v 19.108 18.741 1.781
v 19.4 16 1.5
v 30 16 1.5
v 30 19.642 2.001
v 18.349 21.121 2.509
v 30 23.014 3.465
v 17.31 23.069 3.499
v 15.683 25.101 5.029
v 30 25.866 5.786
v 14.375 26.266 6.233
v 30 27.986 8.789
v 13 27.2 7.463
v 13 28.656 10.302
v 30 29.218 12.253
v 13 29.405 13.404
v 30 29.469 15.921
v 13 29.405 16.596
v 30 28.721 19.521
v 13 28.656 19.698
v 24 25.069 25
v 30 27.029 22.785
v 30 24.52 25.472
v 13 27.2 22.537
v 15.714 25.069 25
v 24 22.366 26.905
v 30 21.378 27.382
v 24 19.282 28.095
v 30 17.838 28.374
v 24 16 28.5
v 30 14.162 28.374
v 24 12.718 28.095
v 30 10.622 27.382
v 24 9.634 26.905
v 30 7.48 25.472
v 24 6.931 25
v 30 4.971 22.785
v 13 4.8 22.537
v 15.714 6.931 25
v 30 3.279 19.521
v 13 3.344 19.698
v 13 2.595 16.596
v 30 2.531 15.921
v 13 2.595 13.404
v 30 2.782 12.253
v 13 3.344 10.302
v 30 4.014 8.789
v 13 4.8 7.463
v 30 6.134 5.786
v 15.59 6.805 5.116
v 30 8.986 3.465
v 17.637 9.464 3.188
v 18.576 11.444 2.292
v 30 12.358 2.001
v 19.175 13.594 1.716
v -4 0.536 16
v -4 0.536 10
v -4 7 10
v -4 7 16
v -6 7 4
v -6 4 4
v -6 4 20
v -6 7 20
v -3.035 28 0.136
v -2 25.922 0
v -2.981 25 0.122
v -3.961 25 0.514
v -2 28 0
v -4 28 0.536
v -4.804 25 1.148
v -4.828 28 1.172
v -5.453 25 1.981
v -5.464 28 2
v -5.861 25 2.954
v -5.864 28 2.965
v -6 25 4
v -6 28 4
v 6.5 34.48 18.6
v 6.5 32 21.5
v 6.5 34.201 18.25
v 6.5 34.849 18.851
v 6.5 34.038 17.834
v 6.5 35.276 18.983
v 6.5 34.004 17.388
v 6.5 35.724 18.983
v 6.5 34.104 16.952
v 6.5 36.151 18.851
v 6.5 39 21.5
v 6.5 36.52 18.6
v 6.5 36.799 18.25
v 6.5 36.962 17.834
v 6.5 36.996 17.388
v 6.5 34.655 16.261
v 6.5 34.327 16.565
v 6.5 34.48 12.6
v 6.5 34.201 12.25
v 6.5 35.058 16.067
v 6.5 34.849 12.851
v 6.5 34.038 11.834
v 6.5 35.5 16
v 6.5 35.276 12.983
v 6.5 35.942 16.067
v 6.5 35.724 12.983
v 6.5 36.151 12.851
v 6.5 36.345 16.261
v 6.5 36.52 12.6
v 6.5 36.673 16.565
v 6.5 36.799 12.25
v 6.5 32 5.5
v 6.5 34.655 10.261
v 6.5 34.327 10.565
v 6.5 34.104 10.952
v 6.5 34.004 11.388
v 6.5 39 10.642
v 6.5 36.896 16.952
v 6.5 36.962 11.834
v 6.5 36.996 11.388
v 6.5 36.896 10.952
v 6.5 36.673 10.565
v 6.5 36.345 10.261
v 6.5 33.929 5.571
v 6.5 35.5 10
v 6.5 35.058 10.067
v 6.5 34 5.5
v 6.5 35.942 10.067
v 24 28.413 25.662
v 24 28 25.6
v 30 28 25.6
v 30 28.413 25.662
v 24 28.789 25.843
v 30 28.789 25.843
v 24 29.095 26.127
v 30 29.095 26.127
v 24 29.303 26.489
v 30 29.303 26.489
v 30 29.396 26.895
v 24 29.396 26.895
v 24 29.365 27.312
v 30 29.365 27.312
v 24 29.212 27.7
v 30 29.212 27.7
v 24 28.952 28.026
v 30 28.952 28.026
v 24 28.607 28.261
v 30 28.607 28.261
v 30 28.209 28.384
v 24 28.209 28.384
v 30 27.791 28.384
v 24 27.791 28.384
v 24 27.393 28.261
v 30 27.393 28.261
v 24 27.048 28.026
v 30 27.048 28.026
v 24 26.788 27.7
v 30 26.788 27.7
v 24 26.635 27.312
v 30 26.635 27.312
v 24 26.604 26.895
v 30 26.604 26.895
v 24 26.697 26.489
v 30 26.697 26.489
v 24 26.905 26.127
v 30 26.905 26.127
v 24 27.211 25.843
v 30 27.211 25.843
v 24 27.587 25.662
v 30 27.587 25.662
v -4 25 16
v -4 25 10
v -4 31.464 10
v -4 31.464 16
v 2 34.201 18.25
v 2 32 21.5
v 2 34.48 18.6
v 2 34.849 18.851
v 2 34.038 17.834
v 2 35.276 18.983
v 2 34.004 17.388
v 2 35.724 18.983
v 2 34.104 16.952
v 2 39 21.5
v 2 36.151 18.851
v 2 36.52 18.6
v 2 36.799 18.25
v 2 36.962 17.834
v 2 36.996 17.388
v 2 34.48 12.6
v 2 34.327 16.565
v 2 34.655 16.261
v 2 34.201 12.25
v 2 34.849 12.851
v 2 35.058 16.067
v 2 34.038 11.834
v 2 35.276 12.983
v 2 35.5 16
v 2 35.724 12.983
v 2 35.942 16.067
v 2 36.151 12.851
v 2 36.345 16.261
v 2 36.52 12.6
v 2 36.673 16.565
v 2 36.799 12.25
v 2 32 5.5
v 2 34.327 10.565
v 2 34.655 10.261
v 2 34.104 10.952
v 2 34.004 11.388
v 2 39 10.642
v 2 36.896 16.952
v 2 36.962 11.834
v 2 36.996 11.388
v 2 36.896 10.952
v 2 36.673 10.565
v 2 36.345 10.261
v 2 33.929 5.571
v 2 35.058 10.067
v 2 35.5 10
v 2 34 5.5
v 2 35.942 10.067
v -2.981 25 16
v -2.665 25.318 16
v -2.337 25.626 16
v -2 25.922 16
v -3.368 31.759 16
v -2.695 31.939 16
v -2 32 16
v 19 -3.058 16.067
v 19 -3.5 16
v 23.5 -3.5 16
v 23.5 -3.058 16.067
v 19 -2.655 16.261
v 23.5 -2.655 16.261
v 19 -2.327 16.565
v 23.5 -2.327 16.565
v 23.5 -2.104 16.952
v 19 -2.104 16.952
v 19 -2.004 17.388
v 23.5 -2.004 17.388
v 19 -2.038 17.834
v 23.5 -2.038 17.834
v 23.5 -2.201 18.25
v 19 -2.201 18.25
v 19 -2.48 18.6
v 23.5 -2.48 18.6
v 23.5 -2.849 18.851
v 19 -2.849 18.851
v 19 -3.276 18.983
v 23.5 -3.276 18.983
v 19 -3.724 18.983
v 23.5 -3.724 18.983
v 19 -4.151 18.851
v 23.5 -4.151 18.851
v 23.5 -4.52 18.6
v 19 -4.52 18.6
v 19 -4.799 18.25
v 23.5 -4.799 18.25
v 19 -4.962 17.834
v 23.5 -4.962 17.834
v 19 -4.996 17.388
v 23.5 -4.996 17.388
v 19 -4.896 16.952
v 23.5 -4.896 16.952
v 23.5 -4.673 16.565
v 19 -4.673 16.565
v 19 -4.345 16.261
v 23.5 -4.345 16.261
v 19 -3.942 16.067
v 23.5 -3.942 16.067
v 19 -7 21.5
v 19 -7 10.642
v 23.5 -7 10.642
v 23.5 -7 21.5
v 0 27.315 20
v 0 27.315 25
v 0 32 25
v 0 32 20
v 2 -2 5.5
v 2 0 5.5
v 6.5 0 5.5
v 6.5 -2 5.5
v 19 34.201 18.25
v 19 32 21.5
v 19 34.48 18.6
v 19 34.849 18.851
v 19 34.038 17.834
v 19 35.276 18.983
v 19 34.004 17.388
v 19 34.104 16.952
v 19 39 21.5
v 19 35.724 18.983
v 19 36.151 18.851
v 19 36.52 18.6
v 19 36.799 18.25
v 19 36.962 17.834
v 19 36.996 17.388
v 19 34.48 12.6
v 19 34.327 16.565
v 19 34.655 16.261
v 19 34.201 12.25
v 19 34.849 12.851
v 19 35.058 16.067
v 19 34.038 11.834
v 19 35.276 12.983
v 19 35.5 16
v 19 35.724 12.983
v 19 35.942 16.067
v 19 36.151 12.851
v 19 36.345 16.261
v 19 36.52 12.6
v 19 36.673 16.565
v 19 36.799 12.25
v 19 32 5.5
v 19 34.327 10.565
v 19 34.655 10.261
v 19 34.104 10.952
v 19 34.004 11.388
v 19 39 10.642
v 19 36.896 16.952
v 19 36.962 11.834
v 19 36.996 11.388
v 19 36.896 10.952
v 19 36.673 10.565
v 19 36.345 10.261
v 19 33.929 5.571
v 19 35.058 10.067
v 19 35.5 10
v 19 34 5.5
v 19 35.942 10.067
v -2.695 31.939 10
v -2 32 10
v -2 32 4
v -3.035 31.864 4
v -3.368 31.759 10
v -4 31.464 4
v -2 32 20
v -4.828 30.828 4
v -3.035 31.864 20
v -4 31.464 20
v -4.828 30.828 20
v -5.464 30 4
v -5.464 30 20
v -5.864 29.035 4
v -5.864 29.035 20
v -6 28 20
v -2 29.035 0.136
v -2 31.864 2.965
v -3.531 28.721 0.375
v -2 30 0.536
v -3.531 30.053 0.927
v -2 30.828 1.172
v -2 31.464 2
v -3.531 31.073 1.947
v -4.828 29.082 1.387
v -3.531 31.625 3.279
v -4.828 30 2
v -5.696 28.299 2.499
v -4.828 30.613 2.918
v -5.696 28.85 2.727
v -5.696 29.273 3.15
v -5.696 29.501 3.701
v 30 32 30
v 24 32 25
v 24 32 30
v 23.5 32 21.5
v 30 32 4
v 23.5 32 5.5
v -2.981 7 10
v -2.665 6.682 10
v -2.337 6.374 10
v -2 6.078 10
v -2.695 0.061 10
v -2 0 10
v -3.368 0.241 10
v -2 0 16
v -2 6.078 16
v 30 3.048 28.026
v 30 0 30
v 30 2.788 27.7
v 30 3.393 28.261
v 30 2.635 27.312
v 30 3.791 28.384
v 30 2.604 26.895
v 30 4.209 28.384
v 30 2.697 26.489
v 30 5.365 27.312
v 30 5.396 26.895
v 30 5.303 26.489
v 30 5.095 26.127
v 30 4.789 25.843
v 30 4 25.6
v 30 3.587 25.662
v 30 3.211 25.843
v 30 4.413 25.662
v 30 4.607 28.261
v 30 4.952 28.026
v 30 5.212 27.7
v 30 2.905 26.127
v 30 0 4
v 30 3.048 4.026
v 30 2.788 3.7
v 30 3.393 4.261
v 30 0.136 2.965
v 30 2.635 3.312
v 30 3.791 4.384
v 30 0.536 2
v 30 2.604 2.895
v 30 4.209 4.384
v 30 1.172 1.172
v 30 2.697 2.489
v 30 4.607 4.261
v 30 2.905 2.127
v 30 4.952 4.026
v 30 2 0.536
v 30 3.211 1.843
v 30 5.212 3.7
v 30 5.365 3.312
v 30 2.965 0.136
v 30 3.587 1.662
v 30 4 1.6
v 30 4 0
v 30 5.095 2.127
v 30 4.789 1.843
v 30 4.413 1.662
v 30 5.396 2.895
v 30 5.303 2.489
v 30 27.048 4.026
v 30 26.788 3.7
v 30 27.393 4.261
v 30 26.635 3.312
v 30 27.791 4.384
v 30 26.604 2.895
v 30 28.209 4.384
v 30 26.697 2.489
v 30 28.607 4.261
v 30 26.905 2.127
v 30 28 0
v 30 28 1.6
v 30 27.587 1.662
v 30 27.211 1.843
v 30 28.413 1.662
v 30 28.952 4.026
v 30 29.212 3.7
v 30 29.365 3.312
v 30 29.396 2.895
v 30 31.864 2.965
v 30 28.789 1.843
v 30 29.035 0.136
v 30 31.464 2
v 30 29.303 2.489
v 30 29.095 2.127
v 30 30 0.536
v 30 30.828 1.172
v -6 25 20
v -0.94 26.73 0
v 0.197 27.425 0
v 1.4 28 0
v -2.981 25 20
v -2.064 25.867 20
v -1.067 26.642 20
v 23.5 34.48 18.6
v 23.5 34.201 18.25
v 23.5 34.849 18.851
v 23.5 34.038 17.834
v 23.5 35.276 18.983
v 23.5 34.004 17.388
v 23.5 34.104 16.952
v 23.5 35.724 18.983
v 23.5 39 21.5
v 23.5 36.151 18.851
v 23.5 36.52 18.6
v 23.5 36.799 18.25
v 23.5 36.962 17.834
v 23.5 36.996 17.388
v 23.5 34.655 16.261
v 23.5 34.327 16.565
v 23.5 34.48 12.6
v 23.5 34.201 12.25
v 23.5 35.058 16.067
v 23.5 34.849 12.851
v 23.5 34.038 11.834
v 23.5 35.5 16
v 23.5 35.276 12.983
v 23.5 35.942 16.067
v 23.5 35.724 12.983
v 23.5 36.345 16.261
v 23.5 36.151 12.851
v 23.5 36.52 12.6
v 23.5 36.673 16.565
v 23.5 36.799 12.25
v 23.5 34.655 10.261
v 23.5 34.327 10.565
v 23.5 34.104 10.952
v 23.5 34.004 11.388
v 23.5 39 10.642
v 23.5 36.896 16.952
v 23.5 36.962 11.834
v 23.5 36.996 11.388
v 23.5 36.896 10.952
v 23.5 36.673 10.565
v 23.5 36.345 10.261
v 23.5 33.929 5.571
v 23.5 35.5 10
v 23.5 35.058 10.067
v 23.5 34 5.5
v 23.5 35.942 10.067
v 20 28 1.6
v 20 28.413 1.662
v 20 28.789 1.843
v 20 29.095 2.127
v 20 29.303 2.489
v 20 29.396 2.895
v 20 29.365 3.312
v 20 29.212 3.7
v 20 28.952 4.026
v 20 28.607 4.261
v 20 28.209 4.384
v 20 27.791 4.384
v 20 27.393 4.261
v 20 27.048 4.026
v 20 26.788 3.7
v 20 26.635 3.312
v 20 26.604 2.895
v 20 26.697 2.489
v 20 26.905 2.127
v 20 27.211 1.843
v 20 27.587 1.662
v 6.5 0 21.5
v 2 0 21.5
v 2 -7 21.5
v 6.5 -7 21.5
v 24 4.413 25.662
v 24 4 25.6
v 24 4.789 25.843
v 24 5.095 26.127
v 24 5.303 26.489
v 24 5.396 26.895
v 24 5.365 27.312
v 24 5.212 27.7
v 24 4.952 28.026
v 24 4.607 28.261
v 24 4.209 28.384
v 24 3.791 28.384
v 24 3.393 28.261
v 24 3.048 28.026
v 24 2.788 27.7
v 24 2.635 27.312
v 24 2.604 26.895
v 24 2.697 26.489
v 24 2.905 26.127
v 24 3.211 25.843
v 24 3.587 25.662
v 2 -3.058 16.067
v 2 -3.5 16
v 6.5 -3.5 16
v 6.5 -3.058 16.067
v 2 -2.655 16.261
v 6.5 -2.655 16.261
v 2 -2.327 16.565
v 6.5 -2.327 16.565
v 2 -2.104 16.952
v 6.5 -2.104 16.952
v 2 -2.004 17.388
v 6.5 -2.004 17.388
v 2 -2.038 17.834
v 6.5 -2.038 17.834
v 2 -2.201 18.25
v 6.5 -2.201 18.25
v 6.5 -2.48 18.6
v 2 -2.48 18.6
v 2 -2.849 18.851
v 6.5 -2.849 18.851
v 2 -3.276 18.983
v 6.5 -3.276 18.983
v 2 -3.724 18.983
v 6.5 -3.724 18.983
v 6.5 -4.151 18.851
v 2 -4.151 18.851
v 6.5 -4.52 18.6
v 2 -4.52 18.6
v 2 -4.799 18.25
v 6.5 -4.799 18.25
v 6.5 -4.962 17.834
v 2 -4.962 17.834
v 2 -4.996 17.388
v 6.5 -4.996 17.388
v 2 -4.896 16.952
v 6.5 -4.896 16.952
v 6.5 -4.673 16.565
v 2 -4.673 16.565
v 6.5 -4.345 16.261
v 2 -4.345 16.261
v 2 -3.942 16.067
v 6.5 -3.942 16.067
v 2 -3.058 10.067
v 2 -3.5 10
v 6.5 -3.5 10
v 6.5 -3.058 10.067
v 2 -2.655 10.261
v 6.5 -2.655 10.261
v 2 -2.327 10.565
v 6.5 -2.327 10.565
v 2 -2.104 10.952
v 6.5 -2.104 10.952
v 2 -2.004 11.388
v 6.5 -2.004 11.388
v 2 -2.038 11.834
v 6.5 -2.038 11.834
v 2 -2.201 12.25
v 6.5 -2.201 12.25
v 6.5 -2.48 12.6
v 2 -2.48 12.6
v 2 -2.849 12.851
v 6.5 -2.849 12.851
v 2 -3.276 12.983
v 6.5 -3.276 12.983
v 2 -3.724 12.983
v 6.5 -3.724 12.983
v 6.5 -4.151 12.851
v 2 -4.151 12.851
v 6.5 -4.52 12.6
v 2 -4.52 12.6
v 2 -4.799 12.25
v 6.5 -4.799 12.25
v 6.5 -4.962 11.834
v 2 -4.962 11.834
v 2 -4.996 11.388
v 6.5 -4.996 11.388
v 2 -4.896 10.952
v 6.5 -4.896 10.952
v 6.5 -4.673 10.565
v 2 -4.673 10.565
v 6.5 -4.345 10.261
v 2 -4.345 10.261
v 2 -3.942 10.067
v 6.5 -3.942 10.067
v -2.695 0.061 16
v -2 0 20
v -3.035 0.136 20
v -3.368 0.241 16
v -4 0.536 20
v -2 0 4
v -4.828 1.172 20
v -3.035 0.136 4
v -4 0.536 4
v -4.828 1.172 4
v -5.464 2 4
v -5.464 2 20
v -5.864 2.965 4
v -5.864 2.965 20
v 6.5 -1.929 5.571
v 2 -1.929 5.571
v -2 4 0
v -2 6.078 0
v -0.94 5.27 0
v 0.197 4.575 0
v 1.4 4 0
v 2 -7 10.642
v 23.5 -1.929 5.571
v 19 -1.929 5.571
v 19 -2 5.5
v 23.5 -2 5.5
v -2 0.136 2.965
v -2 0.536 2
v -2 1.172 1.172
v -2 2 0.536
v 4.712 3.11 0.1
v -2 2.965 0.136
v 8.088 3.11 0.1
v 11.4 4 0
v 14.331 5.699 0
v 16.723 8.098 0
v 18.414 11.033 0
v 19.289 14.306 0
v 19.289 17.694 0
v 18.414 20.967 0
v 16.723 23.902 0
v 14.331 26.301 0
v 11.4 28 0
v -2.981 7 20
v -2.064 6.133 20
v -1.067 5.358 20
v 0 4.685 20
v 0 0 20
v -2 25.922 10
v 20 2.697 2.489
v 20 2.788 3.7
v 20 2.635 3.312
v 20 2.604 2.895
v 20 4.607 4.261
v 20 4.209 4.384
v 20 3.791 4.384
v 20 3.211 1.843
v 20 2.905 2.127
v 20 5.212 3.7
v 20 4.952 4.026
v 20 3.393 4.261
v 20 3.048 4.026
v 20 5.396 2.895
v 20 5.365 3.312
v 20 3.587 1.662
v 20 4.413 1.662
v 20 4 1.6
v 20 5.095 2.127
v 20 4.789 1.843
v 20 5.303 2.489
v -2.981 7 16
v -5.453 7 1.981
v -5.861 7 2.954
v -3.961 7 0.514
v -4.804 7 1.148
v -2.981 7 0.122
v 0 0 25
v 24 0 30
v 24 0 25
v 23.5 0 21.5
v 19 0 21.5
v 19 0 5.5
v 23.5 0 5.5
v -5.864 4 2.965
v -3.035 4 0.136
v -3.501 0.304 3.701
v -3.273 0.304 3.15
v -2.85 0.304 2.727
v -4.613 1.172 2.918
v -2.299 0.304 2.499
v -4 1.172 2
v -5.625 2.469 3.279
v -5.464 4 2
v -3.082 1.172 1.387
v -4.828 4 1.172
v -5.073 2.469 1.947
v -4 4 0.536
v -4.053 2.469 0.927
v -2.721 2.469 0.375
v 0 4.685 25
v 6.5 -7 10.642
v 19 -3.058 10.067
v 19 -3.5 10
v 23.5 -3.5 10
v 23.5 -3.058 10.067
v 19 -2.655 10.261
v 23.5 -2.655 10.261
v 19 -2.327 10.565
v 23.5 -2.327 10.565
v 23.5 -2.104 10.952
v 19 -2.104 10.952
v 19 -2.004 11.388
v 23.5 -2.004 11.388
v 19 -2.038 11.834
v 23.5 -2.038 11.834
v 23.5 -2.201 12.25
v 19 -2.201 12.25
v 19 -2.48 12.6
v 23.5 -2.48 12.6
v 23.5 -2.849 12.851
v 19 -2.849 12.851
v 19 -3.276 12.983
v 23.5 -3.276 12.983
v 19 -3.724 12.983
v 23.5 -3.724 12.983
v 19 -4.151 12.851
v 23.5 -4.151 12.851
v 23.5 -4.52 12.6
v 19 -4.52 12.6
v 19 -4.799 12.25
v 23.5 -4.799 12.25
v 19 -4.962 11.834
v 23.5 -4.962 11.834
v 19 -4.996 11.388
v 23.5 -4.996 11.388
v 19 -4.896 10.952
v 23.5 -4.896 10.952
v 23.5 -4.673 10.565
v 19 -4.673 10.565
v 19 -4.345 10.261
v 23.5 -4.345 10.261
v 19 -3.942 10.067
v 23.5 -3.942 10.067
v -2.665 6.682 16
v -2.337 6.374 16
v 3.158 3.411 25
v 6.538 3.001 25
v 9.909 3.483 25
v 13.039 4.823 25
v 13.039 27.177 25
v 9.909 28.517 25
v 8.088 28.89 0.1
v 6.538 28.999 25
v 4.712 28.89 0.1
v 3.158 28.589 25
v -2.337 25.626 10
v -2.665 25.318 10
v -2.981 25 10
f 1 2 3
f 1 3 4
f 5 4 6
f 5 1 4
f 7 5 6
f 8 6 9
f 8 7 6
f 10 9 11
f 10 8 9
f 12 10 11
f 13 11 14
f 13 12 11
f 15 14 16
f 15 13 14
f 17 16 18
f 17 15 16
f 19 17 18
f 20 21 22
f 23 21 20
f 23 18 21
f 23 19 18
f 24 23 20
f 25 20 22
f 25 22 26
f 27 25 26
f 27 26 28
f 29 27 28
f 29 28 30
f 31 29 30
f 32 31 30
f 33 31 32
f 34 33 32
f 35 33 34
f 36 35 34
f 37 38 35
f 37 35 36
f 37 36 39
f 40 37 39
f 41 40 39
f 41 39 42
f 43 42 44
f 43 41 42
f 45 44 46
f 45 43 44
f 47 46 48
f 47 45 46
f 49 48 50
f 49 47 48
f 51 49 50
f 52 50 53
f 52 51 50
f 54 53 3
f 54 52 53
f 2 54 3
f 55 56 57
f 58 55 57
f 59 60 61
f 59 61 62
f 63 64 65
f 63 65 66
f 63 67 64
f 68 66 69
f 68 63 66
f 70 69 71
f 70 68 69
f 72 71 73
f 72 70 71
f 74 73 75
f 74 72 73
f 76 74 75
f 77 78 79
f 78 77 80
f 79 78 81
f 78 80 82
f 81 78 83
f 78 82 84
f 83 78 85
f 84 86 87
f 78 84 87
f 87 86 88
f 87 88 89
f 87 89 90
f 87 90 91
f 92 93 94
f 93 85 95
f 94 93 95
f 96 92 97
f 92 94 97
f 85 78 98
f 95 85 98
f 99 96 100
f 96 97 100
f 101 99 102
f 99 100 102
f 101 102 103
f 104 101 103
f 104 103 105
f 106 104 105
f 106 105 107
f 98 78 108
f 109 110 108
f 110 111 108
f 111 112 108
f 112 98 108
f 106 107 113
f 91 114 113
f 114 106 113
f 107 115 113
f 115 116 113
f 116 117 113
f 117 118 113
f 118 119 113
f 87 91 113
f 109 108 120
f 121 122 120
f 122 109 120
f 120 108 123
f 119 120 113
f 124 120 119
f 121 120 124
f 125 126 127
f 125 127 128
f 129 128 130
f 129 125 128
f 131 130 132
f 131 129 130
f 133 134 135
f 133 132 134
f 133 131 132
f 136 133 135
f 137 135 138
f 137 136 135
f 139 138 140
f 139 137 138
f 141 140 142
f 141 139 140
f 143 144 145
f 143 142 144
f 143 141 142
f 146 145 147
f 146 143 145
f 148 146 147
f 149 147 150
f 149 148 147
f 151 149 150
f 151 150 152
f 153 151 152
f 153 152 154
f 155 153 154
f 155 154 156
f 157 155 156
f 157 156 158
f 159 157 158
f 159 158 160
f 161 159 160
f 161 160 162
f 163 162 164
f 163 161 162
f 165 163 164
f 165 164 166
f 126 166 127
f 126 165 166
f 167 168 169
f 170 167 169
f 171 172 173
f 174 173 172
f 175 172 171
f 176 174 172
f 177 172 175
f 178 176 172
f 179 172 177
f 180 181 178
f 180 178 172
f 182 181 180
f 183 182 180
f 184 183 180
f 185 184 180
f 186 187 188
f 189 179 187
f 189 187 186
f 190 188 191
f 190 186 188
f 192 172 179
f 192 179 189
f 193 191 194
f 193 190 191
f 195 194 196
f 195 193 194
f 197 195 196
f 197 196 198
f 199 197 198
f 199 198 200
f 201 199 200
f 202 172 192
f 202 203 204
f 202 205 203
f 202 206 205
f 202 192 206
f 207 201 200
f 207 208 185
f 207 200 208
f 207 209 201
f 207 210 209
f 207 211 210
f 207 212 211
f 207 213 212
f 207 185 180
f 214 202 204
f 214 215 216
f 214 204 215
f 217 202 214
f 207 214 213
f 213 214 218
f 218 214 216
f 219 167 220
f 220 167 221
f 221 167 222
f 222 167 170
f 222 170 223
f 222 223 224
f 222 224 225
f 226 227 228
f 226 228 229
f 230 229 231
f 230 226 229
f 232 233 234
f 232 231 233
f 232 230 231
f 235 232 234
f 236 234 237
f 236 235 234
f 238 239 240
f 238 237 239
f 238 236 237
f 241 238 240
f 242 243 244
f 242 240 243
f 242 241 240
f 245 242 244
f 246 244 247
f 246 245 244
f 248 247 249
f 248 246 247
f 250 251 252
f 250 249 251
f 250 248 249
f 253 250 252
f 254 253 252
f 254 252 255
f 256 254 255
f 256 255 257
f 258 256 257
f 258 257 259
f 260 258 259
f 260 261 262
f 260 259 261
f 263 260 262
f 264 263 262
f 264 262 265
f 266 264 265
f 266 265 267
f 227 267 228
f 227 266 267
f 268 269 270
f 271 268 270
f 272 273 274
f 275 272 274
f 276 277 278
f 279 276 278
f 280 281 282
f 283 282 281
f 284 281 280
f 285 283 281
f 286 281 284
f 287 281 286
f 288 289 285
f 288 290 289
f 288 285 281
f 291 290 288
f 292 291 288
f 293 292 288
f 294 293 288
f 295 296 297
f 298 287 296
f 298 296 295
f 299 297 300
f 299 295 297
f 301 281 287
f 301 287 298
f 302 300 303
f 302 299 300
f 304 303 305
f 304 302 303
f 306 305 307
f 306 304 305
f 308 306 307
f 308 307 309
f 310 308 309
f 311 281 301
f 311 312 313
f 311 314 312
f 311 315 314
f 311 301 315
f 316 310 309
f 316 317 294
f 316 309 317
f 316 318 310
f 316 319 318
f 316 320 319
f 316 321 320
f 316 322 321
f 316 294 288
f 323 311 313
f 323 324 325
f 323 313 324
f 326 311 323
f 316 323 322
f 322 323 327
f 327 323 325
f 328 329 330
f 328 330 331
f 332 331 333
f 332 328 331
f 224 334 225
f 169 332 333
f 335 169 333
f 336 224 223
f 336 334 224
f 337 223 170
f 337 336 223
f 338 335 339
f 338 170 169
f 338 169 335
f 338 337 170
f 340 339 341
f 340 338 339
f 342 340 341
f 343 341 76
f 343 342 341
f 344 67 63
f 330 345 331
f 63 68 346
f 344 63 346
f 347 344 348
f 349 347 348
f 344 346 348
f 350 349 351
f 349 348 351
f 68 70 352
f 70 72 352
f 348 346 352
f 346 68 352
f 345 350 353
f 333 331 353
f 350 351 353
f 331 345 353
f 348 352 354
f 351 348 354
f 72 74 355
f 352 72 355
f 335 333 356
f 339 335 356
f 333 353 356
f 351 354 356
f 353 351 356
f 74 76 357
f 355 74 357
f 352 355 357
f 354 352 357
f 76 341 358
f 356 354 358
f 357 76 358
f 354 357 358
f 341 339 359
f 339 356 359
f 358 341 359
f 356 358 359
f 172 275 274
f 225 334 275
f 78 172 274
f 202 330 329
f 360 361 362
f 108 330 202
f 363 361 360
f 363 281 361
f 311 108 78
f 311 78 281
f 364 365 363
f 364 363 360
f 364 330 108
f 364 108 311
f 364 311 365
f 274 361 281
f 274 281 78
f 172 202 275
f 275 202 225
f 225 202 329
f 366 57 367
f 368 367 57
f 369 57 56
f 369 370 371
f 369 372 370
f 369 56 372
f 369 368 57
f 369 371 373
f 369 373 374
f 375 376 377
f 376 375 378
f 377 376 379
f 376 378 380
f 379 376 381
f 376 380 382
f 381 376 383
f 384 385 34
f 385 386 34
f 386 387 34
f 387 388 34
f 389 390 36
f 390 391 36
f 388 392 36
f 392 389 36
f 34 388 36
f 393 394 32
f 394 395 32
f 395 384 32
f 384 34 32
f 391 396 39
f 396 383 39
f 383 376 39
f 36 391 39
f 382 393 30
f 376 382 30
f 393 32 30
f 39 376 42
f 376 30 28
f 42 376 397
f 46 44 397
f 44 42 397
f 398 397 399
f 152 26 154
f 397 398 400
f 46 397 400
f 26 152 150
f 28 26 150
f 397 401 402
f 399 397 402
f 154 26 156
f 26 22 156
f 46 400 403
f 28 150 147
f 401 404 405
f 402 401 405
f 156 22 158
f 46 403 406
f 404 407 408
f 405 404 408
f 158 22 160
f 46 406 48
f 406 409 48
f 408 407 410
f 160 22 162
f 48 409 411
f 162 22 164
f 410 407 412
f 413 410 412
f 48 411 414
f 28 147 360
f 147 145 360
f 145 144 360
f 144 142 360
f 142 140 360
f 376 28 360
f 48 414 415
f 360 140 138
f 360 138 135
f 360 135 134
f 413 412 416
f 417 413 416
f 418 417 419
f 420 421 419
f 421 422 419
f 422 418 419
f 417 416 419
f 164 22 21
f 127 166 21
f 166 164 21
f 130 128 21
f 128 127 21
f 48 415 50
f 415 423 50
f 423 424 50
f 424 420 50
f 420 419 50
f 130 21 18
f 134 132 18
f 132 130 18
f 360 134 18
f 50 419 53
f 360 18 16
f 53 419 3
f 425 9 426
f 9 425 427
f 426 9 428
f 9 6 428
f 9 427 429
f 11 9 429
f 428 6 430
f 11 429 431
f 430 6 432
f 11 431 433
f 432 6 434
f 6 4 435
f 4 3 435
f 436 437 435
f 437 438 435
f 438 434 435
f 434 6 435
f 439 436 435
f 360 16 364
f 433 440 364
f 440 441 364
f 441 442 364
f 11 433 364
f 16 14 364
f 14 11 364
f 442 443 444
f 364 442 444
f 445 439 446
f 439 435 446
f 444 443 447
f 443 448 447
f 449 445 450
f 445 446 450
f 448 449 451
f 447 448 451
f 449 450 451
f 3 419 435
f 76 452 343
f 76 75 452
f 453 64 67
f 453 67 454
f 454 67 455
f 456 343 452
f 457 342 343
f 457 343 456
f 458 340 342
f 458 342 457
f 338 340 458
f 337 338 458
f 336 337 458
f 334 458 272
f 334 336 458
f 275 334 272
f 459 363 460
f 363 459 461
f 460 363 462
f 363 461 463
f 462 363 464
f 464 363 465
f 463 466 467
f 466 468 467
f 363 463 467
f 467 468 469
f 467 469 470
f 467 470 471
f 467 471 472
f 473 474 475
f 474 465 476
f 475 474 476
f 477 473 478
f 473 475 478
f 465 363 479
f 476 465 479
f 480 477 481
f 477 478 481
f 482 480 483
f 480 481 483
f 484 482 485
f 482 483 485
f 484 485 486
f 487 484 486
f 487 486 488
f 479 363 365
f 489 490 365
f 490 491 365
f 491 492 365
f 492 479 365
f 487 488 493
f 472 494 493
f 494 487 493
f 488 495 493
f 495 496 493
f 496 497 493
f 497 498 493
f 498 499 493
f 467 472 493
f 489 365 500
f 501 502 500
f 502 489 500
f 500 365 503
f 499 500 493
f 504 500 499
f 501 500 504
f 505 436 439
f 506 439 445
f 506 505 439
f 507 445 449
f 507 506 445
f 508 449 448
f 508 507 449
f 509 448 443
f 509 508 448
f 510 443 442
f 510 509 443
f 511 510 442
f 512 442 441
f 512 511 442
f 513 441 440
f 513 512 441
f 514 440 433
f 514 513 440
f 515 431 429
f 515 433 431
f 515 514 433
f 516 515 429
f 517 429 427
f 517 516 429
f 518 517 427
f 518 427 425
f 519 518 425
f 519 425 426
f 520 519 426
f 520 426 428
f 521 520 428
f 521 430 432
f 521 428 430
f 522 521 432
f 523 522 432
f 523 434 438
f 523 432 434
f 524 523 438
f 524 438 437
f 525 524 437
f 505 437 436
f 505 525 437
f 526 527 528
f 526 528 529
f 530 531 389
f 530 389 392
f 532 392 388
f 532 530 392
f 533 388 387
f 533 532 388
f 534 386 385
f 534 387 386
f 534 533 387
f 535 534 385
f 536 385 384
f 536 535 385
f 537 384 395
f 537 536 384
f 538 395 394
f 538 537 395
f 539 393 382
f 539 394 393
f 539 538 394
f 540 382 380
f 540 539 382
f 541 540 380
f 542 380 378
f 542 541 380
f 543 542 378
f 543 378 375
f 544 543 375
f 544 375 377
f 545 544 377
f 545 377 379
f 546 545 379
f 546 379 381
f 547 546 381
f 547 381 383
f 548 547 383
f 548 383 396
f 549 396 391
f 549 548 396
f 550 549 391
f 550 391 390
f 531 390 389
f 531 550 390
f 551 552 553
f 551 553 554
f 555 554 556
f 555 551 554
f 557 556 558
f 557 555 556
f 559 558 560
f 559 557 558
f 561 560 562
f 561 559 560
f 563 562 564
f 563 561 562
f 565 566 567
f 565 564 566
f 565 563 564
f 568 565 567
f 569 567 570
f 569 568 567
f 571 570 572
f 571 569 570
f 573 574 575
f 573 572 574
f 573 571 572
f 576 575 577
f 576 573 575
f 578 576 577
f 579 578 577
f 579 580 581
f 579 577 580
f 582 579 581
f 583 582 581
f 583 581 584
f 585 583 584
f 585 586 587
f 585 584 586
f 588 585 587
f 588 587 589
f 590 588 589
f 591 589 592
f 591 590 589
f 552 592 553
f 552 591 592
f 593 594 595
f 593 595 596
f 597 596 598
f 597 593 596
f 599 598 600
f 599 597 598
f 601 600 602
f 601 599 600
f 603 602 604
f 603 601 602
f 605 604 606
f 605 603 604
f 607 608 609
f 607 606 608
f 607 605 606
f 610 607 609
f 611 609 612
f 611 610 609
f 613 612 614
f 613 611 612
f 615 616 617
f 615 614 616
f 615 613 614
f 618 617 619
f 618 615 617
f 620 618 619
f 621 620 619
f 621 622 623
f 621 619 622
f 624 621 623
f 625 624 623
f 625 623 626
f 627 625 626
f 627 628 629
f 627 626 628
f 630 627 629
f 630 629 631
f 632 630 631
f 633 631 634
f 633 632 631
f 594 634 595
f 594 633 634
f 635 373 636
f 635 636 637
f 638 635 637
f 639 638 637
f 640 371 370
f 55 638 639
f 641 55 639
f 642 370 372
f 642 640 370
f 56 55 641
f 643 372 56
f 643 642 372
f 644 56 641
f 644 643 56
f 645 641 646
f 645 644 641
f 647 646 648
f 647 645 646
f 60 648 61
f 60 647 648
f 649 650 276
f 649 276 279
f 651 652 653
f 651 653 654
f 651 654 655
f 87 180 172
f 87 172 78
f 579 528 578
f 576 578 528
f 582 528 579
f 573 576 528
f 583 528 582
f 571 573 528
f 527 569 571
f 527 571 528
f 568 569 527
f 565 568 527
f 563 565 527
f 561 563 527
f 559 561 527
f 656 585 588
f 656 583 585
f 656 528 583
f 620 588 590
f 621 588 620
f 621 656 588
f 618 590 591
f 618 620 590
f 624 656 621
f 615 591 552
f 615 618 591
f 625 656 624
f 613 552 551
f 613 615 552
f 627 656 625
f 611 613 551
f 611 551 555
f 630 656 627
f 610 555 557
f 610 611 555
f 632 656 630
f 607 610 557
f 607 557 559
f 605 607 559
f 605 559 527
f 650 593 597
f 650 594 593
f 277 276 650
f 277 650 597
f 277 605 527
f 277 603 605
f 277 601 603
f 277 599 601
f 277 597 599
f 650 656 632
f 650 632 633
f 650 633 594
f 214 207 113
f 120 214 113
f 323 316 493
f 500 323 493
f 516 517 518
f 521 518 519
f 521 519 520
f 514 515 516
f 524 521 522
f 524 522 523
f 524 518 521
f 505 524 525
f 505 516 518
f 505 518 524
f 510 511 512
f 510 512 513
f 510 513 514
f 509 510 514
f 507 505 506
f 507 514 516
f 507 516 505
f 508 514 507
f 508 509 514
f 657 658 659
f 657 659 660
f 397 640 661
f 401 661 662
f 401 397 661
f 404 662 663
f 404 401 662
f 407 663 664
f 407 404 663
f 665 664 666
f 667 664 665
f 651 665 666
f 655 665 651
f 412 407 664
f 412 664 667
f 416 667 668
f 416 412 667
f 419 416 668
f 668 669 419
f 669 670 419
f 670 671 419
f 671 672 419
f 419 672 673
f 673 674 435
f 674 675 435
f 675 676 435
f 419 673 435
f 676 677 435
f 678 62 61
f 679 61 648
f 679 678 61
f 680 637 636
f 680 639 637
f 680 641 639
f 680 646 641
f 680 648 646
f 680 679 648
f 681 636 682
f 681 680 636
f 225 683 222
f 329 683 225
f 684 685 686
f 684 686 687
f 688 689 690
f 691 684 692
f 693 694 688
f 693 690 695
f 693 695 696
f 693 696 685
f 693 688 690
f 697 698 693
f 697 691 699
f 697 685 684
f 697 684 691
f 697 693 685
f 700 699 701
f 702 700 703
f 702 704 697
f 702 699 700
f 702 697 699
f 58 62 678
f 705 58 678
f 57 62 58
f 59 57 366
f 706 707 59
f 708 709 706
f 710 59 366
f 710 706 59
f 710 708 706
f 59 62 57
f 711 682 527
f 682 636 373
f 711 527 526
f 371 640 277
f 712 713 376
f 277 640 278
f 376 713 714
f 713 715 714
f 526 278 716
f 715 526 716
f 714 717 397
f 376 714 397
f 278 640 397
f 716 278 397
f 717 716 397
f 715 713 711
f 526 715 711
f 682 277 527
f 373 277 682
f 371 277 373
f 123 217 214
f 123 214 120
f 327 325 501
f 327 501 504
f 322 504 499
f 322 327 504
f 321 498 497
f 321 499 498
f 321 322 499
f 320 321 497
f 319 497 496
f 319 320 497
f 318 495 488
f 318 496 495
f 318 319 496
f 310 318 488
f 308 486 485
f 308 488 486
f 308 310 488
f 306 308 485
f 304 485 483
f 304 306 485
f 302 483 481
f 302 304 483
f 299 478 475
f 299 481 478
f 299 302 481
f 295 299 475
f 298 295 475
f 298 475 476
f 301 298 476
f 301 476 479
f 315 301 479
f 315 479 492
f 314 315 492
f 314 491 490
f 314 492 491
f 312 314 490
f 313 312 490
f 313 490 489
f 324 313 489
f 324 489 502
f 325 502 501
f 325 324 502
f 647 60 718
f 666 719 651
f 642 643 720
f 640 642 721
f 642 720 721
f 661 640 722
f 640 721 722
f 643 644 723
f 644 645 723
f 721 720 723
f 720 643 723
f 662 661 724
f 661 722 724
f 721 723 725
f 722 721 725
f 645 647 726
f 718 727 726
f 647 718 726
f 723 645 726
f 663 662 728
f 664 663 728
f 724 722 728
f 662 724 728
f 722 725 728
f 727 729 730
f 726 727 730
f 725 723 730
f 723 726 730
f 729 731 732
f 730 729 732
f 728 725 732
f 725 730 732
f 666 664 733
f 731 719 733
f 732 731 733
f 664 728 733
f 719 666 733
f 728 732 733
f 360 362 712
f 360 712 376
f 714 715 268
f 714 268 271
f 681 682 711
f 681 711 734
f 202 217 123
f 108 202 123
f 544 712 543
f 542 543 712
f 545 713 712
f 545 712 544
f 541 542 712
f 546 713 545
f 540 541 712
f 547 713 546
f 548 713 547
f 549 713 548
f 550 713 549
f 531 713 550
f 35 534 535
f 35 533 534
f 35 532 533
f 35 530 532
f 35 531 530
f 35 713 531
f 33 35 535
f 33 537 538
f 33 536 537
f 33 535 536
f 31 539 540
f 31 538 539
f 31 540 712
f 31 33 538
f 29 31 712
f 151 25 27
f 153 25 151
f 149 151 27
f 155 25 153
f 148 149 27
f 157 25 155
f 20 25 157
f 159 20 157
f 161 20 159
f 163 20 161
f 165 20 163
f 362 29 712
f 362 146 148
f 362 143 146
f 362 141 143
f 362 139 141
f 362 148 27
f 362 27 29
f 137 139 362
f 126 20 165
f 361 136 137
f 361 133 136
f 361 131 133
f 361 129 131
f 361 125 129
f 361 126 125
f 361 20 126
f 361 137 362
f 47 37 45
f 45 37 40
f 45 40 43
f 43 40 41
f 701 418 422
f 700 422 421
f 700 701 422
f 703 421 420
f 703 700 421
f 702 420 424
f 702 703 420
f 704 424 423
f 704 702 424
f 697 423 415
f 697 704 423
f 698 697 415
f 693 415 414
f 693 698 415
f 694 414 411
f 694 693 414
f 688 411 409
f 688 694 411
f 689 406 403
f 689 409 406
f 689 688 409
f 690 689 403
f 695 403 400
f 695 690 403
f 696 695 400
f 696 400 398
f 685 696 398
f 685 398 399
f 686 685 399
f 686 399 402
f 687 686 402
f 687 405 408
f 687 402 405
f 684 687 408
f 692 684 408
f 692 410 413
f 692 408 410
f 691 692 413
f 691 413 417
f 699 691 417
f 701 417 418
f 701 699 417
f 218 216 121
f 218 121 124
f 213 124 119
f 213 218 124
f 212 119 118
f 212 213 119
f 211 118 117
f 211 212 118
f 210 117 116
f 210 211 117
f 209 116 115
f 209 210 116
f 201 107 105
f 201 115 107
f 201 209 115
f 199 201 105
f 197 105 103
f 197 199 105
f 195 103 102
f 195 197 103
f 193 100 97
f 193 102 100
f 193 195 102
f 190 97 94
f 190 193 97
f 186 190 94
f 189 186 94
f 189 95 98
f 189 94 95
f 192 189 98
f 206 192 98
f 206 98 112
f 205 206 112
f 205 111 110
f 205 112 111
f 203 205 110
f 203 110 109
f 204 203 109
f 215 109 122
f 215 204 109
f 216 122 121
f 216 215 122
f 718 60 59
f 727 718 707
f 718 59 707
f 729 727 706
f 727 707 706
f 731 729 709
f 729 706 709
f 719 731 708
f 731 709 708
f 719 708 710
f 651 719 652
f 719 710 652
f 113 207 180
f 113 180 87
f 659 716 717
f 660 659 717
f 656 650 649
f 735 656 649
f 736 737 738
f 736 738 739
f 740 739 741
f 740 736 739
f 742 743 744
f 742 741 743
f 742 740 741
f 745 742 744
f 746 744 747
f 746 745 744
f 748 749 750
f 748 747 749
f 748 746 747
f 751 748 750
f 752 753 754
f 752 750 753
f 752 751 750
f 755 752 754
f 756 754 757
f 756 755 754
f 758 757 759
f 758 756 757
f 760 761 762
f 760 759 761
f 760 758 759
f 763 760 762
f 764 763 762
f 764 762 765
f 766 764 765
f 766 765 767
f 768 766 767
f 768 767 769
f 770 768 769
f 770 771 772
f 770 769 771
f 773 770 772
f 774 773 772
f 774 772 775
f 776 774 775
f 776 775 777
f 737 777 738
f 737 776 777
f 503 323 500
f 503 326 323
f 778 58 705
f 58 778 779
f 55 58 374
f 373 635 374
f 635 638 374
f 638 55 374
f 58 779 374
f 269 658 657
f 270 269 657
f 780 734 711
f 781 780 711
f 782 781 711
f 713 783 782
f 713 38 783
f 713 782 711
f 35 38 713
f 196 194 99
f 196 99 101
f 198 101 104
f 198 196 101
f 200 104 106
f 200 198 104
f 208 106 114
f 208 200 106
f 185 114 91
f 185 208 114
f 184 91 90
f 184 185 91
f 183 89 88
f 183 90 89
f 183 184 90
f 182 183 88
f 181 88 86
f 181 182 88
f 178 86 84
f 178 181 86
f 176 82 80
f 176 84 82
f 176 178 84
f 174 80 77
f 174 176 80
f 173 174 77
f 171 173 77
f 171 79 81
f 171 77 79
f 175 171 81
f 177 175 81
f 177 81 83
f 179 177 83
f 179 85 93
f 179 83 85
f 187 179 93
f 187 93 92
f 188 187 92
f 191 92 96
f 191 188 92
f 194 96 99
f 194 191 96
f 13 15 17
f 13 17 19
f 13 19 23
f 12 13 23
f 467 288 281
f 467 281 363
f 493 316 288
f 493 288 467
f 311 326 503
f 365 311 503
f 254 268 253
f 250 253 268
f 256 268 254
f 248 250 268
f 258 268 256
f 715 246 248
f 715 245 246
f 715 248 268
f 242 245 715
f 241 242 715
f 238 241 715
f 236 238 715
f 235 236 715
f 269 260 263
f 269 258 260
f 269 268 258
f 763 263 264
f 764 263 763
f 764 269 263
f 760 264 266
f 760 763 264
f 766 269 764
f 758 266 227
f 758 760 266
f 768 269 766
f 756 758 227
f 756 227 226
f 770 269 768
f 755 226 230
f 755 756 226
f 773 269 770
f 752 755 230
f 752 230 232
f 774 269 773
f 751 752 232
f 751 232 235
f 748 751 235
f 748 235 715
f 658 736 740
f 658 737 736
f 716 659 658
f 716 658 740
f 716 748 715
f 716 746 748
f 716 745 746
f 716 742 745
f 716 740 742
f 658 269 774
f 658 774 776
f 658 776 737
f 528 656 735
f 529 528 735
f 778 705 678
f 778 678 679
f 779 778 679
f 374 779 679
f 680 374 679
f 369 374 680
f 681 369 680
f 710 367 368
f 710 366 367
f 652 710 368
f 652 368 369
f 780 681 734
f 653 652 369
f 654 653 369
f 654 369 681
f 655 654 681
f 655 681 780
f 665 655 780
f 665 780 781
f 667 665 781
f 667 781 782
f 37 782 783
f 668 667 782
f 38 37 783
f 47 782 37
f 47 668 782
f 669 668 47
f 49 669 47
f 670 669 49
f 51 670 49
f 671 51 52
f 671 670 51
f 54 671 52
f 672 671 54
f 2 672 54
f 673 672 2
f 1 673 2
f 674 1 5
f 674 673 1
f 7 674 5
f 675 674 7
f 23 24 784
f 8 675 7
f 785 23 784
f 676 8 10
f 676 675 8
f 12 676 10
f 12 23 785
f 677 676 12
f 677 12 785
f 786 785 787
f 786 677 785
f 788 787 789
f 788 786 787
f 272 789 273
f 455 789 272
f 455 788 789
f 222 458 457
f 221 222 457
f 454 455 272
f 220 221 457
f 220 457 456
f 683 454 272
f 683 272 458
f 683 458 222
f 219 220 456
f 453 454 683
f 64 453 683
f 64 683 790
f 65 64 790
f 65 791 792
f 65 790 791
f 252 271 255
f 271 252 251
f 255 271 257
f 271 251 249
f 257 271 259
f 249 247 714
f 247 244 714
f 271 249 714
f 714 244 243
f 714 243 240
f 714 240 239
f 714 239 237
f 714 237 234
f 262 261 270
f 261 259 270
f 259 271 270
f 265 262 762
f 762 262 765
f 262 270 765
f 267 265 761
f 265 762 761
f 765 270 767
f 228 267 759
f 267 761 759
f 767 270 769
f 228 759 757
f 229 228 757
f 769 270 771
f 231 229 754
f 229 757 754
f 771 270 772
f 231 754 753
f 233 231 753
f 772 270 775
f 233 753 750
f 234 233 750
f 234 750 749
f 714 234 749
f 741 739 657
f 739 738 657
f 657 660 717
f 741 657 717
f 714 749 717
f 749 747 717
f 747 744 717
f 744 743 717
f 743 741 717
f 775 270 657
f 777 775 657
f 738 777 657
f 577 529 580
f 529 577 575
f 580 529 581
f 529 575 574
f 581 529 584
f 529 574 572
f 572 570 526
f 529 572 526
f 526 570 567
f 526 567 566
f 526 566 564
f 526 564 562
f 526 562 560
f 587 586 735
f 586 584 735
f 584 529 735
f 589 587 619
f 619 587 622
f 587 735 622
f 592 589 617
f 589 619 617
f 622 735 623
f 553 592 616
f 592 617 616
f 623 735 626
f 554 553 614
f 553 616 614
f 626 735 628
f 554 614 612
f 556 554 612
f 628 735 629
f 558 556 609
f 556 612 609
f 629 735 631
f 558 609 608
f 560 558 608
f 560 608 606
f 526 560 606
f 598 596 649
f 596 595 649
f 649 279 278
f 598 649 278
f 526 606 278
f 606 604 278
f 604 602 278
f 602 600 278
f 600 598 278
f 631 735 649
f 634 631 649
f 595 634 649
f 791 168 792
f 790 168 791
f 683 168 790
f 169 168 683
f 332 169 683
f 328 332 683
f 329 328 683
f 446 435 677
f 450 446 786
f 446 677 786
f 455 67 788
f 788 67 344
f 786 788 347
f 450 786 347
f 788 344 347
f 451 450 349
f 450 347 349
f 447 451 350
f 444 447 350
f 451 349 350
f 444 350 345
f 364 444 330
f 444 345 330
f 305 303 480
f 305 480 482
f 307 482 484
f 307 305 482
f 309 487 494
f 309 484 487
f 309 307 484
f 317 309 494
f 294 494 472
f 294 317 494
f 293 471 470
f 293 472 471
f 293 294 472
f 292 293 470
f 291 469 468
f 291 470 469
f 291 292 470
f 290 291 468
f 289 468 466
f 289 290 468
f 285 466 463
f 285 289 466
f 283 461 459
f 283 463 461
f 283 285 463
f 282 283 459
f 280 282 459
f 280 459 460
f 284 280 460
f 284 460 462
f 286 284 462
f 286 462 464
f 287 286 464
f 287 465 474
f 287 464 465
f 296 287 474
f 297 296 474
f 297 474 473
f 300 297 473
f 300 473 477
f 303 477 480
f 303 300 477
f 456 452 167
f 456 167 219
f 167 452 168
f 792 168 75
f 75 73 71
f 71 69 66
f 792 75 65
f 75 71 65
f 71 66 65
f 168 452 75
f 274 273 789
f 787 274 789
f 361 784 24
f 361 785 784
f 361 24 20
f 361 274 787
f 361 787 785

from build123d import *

# Parameters (mm, degrees)
BOX010_W                = 22
BOX010_H                = 10
BOX010_DEPTH            = 10
BOX010_ROLL_ANGLE       = 45
BOX009_W                = 22
BOX009_H                = 10
BOX009_DEPTH            = 10
BOX009_ROLL_ANGLE       = 45
CYLINDER010_R           = 1.5
CYLINDER010_DEPTH       = 40
CYLINDER010_PITCH_ANGLE = 90
CYLINDER011_R           = 1.5
CYLINDER011_DEPTH       = 40
CYLINDER011_PITCH_ANGLE = 90
CYLINDER012_R           = 1.5
CYLINDER012_DEPTH       = 40
CYLINDER012_PITCH_ANGLE = 90
CYLINDER009_R           = 1.5
CYLINDER009_DEPTH       = 40
CYLINDER009_PITCH_ANGLE = 90
BOX004_W                = 2
BOX004_H                = 32
BOX004_DEPTH            = 6
CYLINDER_R              = 13
CYLINDER_DEPTH          = 25
CYLINDER001_R           = 13.5
CYLINDER001_DEPTH       = 18
CYLINDER001_PITCH_ANGLE = 90
CYLINDER003_R           = 1.4
CYLINDER003_DEPTH       = 20
CYLINDER003_PITCH_ANGLE = 90
CYLINDER005_R           = 1.4
CYLINDER005_DEPTH       = 20
CYLINDER005_PITCH_ANGLE = 90
CYLINDER004_R           = 1.4
CYLINDER004_DEPTH       = 20
CYLINDER004_PITCH_ANGLE = 90
CYLINDER002_R           = 1.4
CYLINDER002_DEPTH       = 20
CYLINDER002_PITCH_ANGLE = 90
BOX002_W                = 6
BOX002_H                = 7
BOX002_DEPTH            = 20
BOX006_W                = 4.5
BOX006_H                = 7
BOX006_DEPTH            = 16
BOX007_W                = 4.5
BOX007_H                = 7
BOX007_DEPTH            = 16
BOX008_W                = 4.5
BOX008_H                = 7
BOX008_DEPTH            = 16
BOX005_W                = 4.5
BOX005_H                = 7
BOX005_DEPTH            = 16
BOX003_W                = 6
BOX003_H                = 7
BOX003_DEPTH            = 20
BOX001_W                = 6
BOX001_H                = 32
BOX001_DEPTH            = 30
BOX_W                   = 24
BOX_H                   = 32
BOX_DEPTH               = 25
FILLET_R                = 4
FILLET001_R             = 4
FILLET002_R             = 4
FILLET003_R             = 4


with BuildPart() as cube010:
    # Box010 → Box010 (new body)
    with BuildSketch(Plane.XY):
        with Locations((11, 5)):
            Rectangle(BOX010_W, BOX010_H)
    extrude(amount=BOX010_DEPTH)


with BuildPart() as cube010_1:
    # Box010 roll: moved
    add(cube010.part.rotate(Axis((0, 0, 0), (1, 0, 0)), BOX010_ROLL_ANGLE))


with BuildPart() as cube010_2:
    # Box010 placement: moved
    add(cube010_1.part.moved(Location((2, 41, -7))))


with BuildPart() as fusionwingcuts:
    # Box009 → Box009 (new body)
    with BuildSketch(Plane.XY):
        with Locations((11, 5)):
            Rectangle(BOX009_W, BOX009_H)
    extrude(amount=BOX009_DEPTH)


with BuildPart() as fusionwingcuts_1:
    # Box009 roll: moved
    add(fusionwingcuts.part.rotate(Axis((0, 0, 0), (1, 0, 0)), BOX009_ROLL_ANGLE))


with BuildPart() as fusionwingcuts_2:
    # Box009 placement: moved
    add(fusionwingcuts_1.part.moved(Location((2, -9, -7))))

    # Fusion005: union Cube010
    add(cube010_2.part)


with BuildPart() as fusionwingcuts_3:
    # Fusion005 placement: moved
    add(fusionwingcuts_2.part.moved(Location((0, 0, 5.5))))


with BuildPart() as cylinder010:
    # Cylinder010 → Cylinder010 (new body)
    with BuildSketch(Plane.XY):
        Circle(CYLINDER010_R)
    extrude(amount=CYLINDER010_DEPTH)


with BuildPart() as cylinder010_1:
    # Cylinder010 pitch: moved
    add(cylinder010.part.rotate(Axis((0, 0, 0), (0, 1, 0)), CYLINDER010_PITCH_ANGLE))


with BuildPart() as cylinder010_2:
    # Cylinder010 placement: moved
    add(cylinder010_1.part.moved(Location((0, -3.5, 6))))


with BuildPart() as cylinder011:
    # Cylinder011 → Cylinder011 (new body)
    with BuildSketch(Plane.XY):
        Circle(CYLINDER011_R)
    extrude(amount=CYLINDER011_DEPTH)


with BuildPart() as cylinder011_1:
    # Cylinder011 pitch: moved
    add(cylinder011.part.rotate(Axis((0, 0, 0), (0, 1, 0)), CYLINDER011_PITCH_ANGLE))


with BuildPart() as cylinder011_2:
    # Cylinder011 placement: moved
    add(cylinder011_1.part.moved(Location((0, 35.5, 12))))


with BuildPart() as cylinder012:
    # Cylinder012 → Cylinder012 (new body)
    with BuildSketch(Plane.XY):
        Circle(CYLINDER012_R)
    extrude(amount=CYLINDER012_DEPTH)


with BuildPart() as cylinder012_1:
    # Cylinder012 pitch: moved
    add(cylinder012.part.rotate(Axis((0, 0, 0), (0, 1, 0)), CYLINDER012_PITCH_ANGLE))


with BuildPart() as cylinder012_2:
    # Cylinder012 placement: moved
    add(cylinder012_1.part.moved(Location((0, 35.5, 6))))


with BuildPart() as fusionwingscrews:
    # Cylinder009 → Cylinder009 (new body)
    with BuildSketch(Plane.XY):
        Circle(CYLINDER009_R)
    extrude(amount=CYLINDER009_DEPTH)


with BuildPart() as fusionwingscrews_1:
    # Cylinder009 pitch: moved
    add(fusionwingscrews.part.rotate(Axis((0, 0, 0), (0, 1, 0)), CYLINDER009_PITCH_ANGLE))


with BuildPart() as fusionwingscrews_2:
    # Cylinder009 placement: moved
    add(fusionwingscrews_1.part.moved(Location((0, -3.5, 12))))

    # Fusion004: union Cylinder010, Cylinder011, Cylinder012
    add(cylinder010_2.part)
    add(cylinder011_2.part)
    add(cylinder012_2.part)


with BuildPart() as fusionwingscrews_3:
    # Fusion004 placement: moved
    add(fusionwingscrews_2.part.moved(Location((0, 0, 5.5))))


with BuildPart() as cubeziptiehor:
    # Box004 → Box004 (new body)
    with BuildSketch(Plane(origin=(-4, 0, 10), x_dir=(1, 0, 0), z_dir=(0, 0, 1))):
        with Locations((1, 16)):
            Rectangle(BOX004_W, BOX004_H)
    extrude(amount=BOX004_DEPTH)


with BuildPart() as cylinderheatsink:
    # Cylinder → Cylinder (new body)
    with BuildSketch(Plane(origin=(6.4, 16, 0), x_dir=(1, 0, 0), z_dir=(0, 0, 1))):
        Circle(CYLINDER_R)
    extrude(amount=CYLINDER_DEPTH)


with BuildPart() as cylinderfan:
    # Cylinder001 → Cylinder001 (new body)
    with BuildSketch(Plane.XY):
        Circle(CYLINDER001_R)
    extrude(amount=CYLINDER001_DEPTH)


with BuildPart() as cylinderfan_1:
    # Cylinder001 pitch: moved
    add(cylinderfan.part.rotate(Axis((0, 0, 0), (0, 1, 0)), CYLINDER001_PITCH_ANGLE))


with BuildPart() as cylinderfan_2:
    # Cylinder001 placement: moved
    add(cylinderfan_1.part.moved(Location((13, 16, 15))))


with BuildPart() as cylindertl:
    # Cylinder003 → Cylinder003 (new body)
    with BuildSketch(Plane.XY):
        Circle(CYLINDER003_R)
    extrude(amount=CYLINDER003_DEPTH)


with BuildPart() as cylindertl_1:
    # Cylinder003 pitch: moved
    add(cylindertl.part.rotate(Axis((0, 0, 0), (0, 1, 0)), CYLINDER003_PITCH_ANGLE))


with BuildPart() as cylindertl_2:
    # Cylinder003 placement: moved
    add(cylindertl_1.part.moved(Location((20, 4, 27))))


with BuildPart() as cylinderrb:
    # Cylinder005 → Cylinder005 (new body)
    with BuildSketch(Plane.XY):
        Circle(CYLINDER005_R)
    extrude(amount=CYLINDER005_DEPTH)


with BuildPart() as cylinderrb_1:
    # Cylinder005 pitch: moved
    add(cylinderrb.part.rotate(Axis((0, 0, 0), (0, 1, 0)), CYLINDER005_PITCH_ANGLE))


with BuildPart() as cylinderrb_2:
    # Cylinder005 placement: moved
    add(cylinderrb_1.part.moved(Location((20, 28, 3))))


with BuildPart() as cylindertb:
    # Cylinder004 → Cylinder004 (new body)
    with BuildSketch(Plane.XY):
        Circle(CYLINDER004_R)
    extrude(amount=CYLINDER004_DEPTH)


with BuildPart() as cylindertb_1:
    # Cylinder004 pitch: moved
    add(cylindertb.part.rotate(Axis((0, 0, 0), (0, 1, 0)), CYLINDER004_PITCH_ANGLE))


with BuildPart() as cylindertb_2:
    # Cylinder004 placement: moved
    add(cylindertb_1.part.moved(Location((20, 28, 27))))


with BuildPart() as fusioncuts:
    # Cylinder002 → Cylinder002 (new body)
    with BuildSketch(Plane.XY):
        Circle(CYLINDER002_R)
    extrude(amount=CYLINDER002_DEPTH)


with BuildPart() as fusioncuts_1:
    # Cylinder002 pitch: moved
    add(fusioncuts.part.rotate(Axis((0, 0, 0), (0, 1, 0)), CYLINDER002_PITCH_ANGLE))


with BuildPart() as fusioncuts_2:
    # Cylinder002 placement: moved
    add(fusioncuts_1.part.moved(Location((20, 4, 3))))

    # Fusion001: union CylinderTL, CylinderRB, CylinderTB
    add(cylindertl_2.part)
    add(cylinderrb_2.part)
    add(cylindertb_2.part)

    # Fusion: union FusionWingCuts, FusionWingScrews, CubeZipTieHor, CylinderHeatSink, CylinderFan
    add(fusionwingcuts_3.part)
    add(fusionwingscrews_3.part)
    add(cubeziptiehor.part)
    add(cylinderheatsink.part)
    add(cylinderfan_2.part)


with BuildPart() as cubeziptiel:
    # Box002 → Box002 (new body)
    with BuildSketch(Plane(origin=(-6, 0, 0), x_dir=(1, 0, 0), z_dir=(0, 0, 1))):
        with Locations((3, 3.5)):
            Rectangle(BOX002_W, BOX002_H)
    extrude(amount=BOX002_DEPTH)


with BuildPart() as cube006:
    # Box006 → Box006 (new body)
    with BuildSketch(Plane(origin=(19, -7, 0), x_dir=(1, 0, 0), z_dir=(0, 0, 1))):
        with Locations((2.25, 3.5)):
            Rectangle(BOX006_W, BOX006_H)
    extrude(amount=BOX006_DEPTH)


with BuildPart() as cube007:
    # Box007 → Box007 (new body)
    with BuildSketch(Plane(origin=(2, 32, 0), x_dir=(1, 0, 0), z_dir=(0, 0, 1))):
        with Locations((2.25, 3.5)):
            Rectangle(BOX007_W, BOX007_H)
    extrude(amount=BOX007_DEPTH)


with BuildPart() as cube008:
    # Box008 → Box008 (new body)
    with BuildSketch(Plane(origin=(19, 32, 0), x_dir=(1, 0, 0), z_dir=(0, 0, 1))):
        with Locations((2.25, 3.5)):
            Rectangle(BOX008_W, BOX008_H)
    extrude(amount=BOX008_DEPTH)


with BuildPart() as fusionwings:
    # Box005 → Box005 (new body)
    with BuildSketch(Plane(origin=(2, -7, 0), x_dir=(1, 0, 0), z_dir=(0, 0, 1))):
        with Locations((2.25, 3.5)):
            Rectangle(BOX005_W, BOX005_H)
    extrude(amount=BOX005_DEPTH)

    # Fusion006: union Cube006, Cube007, Cube008
    add(cube006.part)
    add(cube007.part)
    add(cube008.part)


with BuildPart() as fusionwings_1:
    # Fusion006 placement: moved
    add(fusionwings.part.moved(Location((0, 0, 5.5))))


with BuildPart() as cubziptier:
    # Box003 → Box003 (new body)
    with BuildSketch(Plane(origin=(-6, 25, 0), x_dir=(1, 0, 0), z_dir=(0, 0, 1))):
        with Locations((3, 3.5)):
            Rectangle(BOX003_W, BOX003_H)
    extrude(amount=BOX003_DEPTH)


with BuildPart() as cubefrontmask:
    # Box001 → Box001 (new body)
    with BuildSketch(Plane(origin=(24, 0, 0), x_dir=(1, 0, 0), z_dir=(0, 0, 1))):
        with Locations((3, 16)):
            Rectangle(BOX001_W, BOX001_H)
    extrude(amount=BOX001_DEPTH)


with BuildPart() as cute3dv5holder:
    # Box → Box (new body)
    with BuildSketch(Plane.XY):
        with Locations((12, 16)):
            Rectangle(BOX_W, BOX_H)
    extrude(amount=BOX_DEPTH)

    # Fusion007: union CubeZipTieL, FusionWings, CubZipTieR, CubeFrontMask
    add(cubeziptiel.part)
    add(fusionwings_1.part)
    add(cubziptier.part)
    add(cubefrontmask.part)

    # Fillet
    fillet_edges = [cute3dv5holder.edges().sort_by_distance(p)[0] for p in [
        (-6, 3.5, 0),
    ]]
    fillet(fillet_edges, radius=FILLET_R)

    # Fillet001
    fillet001_edges = [cute3dv5holder.edges().sort_by_distance(p)[0] for p in [
        (12, 0, 0),
    ]]
    fillet(fillet001_edges, radius=FILLET001_R)

    # Fillet002
    fillet002_edges = [cute3dv5holder.edges().sort_by_distance(p)[0] for p in [
        (12, 32, 0),
    ]]
    fillet(fillet002_edges, radius=FILLET002_R)

    # Fillet003
    fillet003_edges = [cute3dv5holder.edges().sort_by_distance(p)[0] for p in [
        (-6, 26.5, 0),
    ]]
    fillet(fillet003_edges, radius=FILLET003_R)

    # Cut: cut FusionCUTS
    add(fusioncuts_2.part, mode=Mode.SUBTRACT)


solid = cute3dv5holder.part
